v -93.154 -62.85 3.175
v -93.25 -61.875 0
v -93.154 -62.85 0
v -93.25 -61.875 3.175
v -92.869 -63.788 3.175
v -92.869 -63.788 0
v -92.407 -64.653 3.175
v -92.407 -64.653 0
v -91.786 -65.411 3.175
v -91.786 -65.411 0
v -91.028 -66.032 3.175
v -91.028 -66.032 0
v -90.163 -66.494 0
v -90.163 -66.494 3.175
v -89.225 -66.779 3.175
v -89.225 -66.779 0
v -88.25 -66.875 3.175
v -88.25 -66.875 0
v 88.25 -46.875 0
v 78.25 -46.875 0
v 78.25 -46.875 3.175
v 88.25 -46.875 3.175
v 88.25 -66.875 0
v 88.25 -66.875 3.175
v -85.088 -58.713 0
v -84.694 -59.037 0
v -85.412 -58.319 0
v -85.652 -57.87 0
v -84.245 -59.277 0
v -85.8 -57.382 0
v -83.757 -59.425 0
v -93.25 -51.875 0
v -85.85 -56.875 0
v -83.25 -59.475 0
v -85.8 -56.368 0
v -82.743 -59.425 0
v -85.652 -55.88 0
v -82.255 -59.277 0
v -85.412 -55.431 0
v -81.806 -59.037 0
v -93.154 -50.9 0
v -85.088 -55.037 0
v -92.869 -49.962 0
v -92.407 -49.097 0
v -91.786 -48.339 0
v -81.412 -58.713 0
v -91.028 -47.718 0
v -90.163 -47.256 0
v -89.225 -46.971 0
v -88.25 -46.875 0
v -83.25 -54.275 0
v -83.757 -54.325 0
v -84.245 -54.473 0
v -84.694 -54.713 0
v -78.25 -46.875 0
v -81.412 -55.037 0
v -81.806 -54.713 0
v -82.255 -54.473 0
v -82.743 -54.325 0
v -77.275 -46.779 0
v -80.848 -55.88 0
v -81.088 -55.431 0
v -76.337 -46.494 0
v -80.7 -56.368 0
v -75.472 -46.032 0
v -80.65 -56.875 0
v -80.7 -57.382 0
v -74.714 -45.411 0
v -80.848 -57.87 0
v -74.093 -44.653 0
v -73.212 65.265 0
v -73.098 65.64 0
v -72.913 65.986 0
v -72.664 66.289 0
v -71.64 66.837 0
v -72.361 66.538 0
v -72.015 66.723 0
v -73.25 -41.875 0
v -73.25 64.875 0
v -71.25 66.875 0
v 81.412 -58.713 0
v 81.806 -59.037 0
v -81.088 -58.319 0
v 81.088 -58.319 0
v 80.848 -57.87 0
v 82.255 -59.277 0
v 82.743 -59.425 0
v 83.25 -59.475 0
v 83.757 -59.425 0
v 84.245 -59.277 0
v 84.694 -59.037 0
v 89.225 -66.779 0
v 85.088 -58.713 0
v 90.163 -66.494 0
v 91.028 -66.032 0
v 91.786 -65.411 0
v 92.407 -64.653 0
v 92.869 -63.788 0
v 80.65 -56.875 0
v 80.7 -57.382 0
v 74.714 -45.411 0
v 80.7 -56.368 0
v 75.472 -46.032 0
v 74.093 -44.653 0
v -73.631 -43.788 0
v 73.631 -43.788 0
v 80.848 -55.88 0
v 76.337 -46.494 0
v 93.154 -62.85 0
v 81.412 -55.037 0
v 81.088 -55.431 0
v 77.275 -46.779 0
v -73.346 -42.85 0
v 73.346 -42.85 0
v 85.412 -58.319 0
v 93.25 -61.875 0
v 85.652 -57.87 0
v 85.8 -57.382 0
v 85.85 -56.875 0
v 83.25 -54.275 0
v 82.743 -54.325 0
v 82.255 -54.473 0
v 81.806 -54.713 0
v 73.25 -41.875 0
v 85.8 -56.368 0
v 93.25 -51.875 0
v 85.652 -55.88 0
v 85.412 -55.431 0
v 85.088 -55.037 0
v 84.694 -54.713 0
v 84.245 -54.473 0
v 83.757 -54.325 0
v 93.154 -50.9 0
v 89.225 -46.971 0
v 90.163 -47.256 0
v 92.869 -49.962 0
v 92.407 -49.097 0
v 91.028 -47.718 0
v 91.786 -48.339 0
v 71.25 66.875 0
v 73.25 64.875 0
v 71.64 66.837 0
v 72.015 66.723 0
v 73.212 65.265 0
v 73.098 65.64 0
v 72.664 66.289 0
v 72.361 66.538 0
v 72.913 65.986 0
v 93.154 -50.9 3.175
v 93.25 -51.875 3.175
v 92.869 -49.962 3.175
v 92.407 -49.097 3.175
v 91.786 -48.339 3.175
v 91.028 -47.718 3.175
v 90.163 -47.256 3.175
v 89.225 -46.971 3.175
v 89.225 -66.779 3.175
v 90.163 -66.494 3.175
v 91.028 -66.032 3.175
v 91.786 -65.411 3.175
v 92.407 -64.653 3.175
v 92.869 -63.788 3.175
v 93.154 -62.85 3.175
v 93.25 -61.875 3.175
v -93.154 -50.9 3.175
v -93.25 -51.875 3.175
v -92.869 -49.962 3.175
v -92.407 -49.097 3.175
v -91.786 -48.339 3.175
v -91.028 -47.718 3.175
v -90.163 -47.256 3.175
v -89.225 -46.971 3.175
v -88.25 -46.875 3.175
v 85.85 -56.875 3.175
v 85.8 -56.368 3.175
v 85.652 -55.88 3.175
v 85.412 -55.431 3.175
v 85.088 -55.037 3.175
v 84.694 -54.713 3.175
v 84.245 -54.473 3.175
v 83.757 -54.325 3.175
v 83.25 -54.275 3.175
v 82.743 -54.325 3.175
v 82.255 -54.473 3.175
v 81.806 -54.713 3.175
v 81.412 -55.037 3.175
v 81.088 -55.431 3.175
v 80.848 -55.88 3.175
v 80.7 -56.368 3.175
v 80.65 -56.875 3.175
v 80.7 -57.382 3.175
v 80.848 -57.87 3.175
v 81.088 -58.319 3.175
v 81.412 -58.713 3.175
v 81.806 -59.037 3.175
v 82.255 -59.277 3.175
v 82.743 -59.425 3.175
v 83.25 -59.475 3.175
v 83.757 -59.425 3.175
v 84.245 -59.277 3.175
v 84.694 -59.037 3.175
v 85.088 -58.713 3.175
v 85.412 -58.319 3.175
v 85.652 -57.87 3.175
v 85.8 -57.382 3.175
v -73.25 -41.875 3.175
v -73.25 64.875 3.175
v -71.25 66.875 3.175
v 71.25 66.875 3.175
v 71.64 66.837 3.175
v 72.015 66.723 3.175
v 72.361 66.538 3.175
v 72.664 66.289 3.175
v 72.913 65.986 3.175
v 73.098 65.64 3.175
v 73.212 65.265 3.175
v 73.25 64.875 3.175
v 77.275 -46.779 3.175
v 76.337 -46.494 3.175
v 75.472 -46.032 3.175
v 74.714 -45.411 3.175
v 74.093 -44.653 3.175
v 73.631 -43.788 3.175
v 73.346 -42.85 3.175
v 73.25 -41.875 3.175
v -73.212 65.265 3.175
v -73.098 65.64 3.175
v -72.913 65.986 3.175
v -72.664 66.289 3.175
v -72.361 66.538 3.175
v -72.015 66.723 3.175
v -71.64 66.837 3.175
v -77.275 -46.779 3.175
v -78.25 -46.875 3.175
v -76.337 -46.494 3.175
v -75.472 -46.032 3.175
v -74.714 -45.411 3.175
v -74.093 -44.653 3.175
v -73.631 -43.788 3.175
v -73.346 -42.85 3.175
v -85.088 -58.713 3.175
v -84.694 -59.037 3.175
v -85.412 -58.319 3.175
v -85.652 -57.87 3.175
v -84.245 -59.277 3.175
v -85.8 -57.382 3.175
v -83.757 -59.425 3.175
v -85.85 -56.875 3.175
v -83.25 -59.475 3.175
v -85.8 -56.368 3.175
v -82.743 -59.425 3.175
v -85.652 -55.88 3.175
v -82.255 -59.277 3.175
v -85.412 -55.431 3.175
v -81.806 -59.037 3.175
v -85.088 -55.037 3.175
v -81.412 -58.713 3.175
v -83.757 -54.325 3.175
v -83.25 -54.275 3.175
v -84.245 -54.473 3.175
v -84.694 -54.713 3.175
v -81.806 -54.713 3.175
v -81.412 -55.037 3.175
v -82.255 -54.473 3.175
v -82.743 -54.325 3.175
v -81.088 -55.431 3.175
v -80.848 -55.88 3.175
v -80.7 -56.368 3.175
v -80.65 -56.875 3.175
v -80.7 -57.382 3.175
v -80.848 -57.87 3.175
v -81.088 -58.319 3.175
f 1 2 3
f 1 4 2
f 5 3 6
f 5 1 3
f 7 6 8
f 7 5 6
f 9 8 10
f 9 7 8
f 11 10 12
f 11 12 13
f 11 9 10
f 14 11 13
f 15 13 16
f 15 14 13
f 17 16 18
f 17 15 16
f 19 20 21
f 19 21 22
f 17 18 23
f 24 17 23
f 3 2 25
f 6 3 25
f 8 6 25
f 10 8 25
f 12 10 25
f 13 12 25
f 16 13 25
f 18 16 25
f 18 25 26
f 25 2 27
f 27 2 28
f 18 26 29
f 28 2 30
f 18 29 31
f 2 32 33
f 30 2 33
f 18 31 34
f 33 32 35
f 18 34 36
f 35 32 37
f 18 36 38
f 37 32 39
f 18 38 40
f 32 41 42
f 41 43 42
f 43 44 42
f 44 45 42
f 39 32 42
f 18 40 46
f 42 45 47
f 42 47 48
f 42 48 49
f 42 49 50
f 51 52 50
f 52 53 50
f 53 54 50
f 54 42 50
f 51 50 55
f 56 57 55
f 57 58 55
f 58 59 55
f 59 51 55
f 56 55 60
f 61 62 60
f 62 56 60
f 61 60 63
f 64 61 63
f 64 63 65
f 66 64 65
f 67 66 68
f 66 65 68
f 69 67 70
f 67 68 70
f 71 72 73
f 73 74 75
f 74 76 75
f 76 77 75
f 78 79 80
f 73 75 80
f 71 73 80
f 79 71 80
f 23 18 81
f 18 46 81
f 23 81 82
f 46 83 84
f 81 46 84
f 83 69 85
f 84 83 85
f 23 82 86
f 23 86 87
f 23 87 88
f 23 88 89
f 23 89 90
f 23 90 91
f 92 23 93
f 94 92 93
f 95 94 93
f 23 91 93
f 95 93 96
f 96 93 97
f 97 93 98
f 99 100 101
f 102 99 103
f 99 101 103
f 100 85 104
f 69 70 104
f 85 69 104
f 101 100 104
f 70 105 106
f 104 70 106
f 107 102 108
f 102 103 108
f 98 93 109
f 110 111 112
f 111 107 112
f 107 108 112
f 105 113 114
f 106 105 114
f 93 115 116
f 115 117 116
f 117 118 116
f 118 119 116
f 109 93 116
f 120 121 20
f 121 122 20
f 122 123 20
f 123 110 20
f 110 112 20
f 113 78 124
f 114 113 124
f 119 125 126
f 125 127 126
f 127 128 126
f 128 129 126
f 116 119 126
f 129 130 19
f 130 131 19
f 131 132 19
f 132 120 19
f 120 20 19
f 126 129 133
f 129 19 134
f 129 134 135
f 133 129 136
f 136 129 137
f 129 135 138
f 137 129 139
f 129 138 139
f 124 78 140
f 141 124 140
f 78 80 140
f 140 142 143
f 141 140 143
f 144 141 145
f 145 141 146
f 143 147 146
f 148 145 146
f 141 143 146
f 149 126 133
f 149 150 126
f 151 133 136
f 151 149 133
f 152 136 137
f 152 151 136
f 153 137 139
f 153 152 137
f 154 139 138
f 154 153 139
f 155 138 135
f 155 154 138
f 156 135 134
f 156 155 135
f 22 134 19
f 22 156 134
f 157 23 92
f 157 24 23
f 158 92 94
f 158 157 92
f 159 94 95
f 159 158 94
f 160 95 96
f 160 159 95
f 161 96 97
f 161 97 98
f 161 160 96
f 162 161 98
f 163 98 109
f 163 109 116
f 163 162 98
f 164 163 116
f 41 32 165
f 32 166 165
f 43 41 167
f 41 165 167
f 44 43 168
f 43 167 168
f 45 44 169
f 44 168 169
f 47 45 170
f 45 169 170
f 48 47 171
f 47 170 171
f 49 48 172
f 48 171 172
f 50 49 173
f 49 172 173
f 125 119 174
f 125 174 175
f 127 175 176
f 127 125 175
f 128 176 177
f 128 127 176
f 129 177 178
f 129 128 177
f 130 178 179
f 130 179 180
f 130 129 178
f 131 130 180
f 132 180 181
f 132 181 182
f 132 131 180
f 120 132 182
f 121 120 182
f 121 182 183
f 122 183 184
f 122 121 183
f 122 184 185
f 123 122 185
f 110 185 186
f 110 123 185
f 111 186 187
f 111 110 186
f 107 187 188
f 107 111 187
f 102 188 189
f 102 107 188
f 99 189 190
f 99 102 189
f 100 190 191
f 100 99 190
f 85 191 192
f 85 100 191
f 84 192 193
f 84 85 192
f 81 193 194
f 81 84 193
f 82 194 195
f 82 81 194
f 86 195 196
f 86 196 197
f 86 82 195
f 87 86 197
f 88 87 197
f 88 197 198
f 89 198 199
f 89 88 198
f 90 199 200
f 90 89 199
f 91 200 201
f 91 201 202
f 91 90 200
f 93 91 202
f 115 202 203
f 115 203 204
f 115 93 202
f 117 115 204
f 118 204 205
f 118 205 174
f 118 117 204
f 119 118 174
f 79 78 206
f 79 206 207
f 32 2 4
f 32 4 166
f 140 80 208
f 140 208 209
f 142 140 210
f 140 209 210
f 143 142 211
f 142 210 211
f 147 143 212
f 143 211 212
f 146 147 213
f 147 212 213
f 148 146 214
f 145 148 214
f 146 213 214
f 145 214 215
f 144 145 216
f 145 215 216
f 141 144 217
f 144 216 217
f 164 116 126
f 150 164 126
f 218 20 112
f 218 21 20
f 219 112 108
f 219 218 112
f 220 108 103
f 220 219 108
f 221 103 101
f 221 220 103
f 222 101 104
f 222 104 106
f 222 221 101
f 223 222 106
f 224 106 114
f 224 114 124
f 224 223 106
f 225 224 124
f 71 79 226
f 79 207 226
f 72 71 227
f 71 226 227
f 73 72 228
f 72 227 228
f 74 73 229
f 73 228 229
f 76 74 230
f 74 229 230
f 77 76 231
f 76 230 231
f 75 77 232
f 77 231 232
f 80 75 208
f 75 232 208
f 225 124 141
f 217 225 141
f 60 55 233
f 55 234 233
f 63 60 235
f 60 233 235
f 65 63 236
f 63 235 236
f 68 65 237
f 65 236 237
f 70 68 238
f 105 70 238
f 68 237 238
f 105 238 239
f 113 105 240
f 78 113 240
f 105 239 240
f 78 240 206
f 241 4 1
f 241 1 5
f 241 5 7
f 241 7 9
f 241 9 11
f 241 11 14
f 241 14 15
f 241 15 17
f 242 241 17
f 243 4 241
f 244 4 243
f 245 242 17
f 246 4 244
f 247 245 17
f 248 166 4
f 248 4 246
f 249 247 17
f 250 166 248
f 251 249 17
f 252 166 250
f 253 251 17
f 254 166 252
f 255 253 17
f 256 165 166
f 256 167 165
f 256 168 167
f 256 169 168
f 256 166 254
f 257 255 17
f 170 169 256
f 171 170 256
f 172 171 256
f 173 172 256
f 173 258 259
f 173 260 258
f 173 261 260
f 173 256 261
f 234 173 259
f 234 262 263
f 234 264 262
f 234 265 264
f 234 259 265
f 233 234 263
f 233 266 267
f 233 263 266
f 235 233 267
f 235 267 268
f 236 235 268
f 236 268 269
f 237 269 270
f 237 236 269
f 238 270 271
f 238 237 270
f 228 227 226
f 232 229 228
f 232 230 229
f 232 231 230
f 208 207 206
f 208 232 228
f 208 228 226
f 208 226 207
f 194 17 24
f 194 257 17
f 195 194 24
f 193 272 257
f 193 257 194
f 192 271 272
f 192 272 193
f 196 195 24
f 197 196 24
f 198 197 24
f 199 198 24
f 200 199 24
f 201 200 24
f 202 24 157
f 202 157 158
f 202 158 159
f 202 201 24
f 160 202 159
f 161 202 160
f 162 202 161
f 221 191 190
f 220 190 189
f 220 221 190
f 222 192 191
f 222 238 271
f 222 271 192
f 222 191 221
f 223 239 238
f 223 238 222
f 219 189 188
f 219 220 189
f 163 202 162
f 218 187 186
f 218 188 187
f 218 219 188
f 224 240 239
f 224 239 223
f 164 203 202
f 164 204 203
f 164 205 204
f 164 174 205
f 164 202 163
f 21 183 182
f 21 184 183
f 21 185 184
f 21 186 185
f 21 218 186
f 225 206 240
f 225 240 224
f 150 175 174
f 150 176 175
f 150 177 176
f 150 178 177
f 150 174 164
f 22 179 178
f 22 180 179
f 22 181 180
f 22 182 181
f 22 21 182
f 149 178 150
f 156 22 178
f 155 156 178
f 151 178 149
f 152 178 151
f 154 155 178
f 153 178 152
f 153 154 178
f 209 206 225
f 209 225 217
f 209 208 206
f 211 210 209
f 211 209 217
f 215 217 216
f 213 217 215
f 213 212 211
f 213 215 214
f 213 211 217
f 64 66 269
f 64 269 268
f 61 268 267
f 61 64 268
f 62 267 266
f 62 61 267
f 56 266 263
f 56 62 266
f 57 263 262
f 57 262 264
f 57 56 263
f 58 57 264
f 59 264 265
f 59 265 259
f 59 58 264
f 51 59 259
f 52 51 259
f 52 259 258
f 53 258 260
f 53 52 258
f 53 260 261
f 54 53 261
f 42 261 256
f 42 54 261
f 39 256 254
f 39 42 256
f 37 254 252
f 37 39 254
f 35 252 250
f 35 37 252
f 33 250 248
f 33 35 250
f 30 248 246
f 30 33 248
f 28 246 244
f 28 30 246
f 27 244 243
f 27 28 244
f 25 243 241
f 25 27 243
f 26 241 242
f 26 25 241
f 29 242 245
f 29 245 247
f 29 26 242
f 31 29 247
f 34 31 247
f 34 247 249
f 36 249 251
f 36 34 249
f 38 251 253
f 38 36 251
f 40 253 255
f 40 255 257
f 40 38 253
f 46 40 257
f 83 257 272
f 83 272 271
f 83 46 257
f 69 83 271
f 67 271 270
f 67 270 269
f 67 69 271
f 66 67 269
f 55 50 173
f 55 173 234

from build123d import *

# Parameters (mm, degrees)
SKETCH1_W           = 20
SKETCH1_H           = 20
SKETCH1_R           = 2.6
SKETCH1_W_2         = 146.5
SKETCH1_H_2         = 133.75
BOSS_EXTRUDE1_DEPTH = 3.175
FILLET2_R           = 5
FILLET3_R           = 2


with BuildPart() as part:
    # Sketch1 → Boss-Extrude1 (new body)
    with BuildSketch(Plane.XY):
        with Locations((-83.25, -56.875)):
            Rectangle(SKETCH1_W, SKETCH1_H)
        with Locations((-83.25, -56.875)):
            Circle(SKETCH1_R, mode=Mode.SUBTRACT)
        Rectangle(SKETCH1_W_2, SKETCH1_H_2)
        with Locations((83.25, -56.875)):
            Rectangle(SKETCH1_W, SKETCH1_H)
        with Locations((83.25, -56.875)):
            Circle(SKETCH1_R, mode=Mode.SUBTRACT)
    extrude(amount=BOSS_EXTRUDE1_DEPTH)

    # Fillet2
    fillet2_edges = [part.edges().sort_by_distance(p)[0] for p in [
        (-73.25, -46.875, 1.5875),
        (73.25, -46.875, 1.5875),
        (93.25, -46.875, 1.5875),
        (93.25, -66.875, 1.5875),
        (-93.25, -66.875, 1.5875),
        (-93.25, -46.875, 1.5875),
    ]]
    fillet(fillet2_edges, radius=FILLET2_R)

    # Fillet3
    fillet3_edges = [part.edges().sort_by_distance(p)[0] for p in [
        (-73.25, 66.875, 1.5875),
        (73.25, 66.875, 1.5875),
    ]]
    fillet(fillet3_edges, radius=FILLET3_R)


solid = part.part
